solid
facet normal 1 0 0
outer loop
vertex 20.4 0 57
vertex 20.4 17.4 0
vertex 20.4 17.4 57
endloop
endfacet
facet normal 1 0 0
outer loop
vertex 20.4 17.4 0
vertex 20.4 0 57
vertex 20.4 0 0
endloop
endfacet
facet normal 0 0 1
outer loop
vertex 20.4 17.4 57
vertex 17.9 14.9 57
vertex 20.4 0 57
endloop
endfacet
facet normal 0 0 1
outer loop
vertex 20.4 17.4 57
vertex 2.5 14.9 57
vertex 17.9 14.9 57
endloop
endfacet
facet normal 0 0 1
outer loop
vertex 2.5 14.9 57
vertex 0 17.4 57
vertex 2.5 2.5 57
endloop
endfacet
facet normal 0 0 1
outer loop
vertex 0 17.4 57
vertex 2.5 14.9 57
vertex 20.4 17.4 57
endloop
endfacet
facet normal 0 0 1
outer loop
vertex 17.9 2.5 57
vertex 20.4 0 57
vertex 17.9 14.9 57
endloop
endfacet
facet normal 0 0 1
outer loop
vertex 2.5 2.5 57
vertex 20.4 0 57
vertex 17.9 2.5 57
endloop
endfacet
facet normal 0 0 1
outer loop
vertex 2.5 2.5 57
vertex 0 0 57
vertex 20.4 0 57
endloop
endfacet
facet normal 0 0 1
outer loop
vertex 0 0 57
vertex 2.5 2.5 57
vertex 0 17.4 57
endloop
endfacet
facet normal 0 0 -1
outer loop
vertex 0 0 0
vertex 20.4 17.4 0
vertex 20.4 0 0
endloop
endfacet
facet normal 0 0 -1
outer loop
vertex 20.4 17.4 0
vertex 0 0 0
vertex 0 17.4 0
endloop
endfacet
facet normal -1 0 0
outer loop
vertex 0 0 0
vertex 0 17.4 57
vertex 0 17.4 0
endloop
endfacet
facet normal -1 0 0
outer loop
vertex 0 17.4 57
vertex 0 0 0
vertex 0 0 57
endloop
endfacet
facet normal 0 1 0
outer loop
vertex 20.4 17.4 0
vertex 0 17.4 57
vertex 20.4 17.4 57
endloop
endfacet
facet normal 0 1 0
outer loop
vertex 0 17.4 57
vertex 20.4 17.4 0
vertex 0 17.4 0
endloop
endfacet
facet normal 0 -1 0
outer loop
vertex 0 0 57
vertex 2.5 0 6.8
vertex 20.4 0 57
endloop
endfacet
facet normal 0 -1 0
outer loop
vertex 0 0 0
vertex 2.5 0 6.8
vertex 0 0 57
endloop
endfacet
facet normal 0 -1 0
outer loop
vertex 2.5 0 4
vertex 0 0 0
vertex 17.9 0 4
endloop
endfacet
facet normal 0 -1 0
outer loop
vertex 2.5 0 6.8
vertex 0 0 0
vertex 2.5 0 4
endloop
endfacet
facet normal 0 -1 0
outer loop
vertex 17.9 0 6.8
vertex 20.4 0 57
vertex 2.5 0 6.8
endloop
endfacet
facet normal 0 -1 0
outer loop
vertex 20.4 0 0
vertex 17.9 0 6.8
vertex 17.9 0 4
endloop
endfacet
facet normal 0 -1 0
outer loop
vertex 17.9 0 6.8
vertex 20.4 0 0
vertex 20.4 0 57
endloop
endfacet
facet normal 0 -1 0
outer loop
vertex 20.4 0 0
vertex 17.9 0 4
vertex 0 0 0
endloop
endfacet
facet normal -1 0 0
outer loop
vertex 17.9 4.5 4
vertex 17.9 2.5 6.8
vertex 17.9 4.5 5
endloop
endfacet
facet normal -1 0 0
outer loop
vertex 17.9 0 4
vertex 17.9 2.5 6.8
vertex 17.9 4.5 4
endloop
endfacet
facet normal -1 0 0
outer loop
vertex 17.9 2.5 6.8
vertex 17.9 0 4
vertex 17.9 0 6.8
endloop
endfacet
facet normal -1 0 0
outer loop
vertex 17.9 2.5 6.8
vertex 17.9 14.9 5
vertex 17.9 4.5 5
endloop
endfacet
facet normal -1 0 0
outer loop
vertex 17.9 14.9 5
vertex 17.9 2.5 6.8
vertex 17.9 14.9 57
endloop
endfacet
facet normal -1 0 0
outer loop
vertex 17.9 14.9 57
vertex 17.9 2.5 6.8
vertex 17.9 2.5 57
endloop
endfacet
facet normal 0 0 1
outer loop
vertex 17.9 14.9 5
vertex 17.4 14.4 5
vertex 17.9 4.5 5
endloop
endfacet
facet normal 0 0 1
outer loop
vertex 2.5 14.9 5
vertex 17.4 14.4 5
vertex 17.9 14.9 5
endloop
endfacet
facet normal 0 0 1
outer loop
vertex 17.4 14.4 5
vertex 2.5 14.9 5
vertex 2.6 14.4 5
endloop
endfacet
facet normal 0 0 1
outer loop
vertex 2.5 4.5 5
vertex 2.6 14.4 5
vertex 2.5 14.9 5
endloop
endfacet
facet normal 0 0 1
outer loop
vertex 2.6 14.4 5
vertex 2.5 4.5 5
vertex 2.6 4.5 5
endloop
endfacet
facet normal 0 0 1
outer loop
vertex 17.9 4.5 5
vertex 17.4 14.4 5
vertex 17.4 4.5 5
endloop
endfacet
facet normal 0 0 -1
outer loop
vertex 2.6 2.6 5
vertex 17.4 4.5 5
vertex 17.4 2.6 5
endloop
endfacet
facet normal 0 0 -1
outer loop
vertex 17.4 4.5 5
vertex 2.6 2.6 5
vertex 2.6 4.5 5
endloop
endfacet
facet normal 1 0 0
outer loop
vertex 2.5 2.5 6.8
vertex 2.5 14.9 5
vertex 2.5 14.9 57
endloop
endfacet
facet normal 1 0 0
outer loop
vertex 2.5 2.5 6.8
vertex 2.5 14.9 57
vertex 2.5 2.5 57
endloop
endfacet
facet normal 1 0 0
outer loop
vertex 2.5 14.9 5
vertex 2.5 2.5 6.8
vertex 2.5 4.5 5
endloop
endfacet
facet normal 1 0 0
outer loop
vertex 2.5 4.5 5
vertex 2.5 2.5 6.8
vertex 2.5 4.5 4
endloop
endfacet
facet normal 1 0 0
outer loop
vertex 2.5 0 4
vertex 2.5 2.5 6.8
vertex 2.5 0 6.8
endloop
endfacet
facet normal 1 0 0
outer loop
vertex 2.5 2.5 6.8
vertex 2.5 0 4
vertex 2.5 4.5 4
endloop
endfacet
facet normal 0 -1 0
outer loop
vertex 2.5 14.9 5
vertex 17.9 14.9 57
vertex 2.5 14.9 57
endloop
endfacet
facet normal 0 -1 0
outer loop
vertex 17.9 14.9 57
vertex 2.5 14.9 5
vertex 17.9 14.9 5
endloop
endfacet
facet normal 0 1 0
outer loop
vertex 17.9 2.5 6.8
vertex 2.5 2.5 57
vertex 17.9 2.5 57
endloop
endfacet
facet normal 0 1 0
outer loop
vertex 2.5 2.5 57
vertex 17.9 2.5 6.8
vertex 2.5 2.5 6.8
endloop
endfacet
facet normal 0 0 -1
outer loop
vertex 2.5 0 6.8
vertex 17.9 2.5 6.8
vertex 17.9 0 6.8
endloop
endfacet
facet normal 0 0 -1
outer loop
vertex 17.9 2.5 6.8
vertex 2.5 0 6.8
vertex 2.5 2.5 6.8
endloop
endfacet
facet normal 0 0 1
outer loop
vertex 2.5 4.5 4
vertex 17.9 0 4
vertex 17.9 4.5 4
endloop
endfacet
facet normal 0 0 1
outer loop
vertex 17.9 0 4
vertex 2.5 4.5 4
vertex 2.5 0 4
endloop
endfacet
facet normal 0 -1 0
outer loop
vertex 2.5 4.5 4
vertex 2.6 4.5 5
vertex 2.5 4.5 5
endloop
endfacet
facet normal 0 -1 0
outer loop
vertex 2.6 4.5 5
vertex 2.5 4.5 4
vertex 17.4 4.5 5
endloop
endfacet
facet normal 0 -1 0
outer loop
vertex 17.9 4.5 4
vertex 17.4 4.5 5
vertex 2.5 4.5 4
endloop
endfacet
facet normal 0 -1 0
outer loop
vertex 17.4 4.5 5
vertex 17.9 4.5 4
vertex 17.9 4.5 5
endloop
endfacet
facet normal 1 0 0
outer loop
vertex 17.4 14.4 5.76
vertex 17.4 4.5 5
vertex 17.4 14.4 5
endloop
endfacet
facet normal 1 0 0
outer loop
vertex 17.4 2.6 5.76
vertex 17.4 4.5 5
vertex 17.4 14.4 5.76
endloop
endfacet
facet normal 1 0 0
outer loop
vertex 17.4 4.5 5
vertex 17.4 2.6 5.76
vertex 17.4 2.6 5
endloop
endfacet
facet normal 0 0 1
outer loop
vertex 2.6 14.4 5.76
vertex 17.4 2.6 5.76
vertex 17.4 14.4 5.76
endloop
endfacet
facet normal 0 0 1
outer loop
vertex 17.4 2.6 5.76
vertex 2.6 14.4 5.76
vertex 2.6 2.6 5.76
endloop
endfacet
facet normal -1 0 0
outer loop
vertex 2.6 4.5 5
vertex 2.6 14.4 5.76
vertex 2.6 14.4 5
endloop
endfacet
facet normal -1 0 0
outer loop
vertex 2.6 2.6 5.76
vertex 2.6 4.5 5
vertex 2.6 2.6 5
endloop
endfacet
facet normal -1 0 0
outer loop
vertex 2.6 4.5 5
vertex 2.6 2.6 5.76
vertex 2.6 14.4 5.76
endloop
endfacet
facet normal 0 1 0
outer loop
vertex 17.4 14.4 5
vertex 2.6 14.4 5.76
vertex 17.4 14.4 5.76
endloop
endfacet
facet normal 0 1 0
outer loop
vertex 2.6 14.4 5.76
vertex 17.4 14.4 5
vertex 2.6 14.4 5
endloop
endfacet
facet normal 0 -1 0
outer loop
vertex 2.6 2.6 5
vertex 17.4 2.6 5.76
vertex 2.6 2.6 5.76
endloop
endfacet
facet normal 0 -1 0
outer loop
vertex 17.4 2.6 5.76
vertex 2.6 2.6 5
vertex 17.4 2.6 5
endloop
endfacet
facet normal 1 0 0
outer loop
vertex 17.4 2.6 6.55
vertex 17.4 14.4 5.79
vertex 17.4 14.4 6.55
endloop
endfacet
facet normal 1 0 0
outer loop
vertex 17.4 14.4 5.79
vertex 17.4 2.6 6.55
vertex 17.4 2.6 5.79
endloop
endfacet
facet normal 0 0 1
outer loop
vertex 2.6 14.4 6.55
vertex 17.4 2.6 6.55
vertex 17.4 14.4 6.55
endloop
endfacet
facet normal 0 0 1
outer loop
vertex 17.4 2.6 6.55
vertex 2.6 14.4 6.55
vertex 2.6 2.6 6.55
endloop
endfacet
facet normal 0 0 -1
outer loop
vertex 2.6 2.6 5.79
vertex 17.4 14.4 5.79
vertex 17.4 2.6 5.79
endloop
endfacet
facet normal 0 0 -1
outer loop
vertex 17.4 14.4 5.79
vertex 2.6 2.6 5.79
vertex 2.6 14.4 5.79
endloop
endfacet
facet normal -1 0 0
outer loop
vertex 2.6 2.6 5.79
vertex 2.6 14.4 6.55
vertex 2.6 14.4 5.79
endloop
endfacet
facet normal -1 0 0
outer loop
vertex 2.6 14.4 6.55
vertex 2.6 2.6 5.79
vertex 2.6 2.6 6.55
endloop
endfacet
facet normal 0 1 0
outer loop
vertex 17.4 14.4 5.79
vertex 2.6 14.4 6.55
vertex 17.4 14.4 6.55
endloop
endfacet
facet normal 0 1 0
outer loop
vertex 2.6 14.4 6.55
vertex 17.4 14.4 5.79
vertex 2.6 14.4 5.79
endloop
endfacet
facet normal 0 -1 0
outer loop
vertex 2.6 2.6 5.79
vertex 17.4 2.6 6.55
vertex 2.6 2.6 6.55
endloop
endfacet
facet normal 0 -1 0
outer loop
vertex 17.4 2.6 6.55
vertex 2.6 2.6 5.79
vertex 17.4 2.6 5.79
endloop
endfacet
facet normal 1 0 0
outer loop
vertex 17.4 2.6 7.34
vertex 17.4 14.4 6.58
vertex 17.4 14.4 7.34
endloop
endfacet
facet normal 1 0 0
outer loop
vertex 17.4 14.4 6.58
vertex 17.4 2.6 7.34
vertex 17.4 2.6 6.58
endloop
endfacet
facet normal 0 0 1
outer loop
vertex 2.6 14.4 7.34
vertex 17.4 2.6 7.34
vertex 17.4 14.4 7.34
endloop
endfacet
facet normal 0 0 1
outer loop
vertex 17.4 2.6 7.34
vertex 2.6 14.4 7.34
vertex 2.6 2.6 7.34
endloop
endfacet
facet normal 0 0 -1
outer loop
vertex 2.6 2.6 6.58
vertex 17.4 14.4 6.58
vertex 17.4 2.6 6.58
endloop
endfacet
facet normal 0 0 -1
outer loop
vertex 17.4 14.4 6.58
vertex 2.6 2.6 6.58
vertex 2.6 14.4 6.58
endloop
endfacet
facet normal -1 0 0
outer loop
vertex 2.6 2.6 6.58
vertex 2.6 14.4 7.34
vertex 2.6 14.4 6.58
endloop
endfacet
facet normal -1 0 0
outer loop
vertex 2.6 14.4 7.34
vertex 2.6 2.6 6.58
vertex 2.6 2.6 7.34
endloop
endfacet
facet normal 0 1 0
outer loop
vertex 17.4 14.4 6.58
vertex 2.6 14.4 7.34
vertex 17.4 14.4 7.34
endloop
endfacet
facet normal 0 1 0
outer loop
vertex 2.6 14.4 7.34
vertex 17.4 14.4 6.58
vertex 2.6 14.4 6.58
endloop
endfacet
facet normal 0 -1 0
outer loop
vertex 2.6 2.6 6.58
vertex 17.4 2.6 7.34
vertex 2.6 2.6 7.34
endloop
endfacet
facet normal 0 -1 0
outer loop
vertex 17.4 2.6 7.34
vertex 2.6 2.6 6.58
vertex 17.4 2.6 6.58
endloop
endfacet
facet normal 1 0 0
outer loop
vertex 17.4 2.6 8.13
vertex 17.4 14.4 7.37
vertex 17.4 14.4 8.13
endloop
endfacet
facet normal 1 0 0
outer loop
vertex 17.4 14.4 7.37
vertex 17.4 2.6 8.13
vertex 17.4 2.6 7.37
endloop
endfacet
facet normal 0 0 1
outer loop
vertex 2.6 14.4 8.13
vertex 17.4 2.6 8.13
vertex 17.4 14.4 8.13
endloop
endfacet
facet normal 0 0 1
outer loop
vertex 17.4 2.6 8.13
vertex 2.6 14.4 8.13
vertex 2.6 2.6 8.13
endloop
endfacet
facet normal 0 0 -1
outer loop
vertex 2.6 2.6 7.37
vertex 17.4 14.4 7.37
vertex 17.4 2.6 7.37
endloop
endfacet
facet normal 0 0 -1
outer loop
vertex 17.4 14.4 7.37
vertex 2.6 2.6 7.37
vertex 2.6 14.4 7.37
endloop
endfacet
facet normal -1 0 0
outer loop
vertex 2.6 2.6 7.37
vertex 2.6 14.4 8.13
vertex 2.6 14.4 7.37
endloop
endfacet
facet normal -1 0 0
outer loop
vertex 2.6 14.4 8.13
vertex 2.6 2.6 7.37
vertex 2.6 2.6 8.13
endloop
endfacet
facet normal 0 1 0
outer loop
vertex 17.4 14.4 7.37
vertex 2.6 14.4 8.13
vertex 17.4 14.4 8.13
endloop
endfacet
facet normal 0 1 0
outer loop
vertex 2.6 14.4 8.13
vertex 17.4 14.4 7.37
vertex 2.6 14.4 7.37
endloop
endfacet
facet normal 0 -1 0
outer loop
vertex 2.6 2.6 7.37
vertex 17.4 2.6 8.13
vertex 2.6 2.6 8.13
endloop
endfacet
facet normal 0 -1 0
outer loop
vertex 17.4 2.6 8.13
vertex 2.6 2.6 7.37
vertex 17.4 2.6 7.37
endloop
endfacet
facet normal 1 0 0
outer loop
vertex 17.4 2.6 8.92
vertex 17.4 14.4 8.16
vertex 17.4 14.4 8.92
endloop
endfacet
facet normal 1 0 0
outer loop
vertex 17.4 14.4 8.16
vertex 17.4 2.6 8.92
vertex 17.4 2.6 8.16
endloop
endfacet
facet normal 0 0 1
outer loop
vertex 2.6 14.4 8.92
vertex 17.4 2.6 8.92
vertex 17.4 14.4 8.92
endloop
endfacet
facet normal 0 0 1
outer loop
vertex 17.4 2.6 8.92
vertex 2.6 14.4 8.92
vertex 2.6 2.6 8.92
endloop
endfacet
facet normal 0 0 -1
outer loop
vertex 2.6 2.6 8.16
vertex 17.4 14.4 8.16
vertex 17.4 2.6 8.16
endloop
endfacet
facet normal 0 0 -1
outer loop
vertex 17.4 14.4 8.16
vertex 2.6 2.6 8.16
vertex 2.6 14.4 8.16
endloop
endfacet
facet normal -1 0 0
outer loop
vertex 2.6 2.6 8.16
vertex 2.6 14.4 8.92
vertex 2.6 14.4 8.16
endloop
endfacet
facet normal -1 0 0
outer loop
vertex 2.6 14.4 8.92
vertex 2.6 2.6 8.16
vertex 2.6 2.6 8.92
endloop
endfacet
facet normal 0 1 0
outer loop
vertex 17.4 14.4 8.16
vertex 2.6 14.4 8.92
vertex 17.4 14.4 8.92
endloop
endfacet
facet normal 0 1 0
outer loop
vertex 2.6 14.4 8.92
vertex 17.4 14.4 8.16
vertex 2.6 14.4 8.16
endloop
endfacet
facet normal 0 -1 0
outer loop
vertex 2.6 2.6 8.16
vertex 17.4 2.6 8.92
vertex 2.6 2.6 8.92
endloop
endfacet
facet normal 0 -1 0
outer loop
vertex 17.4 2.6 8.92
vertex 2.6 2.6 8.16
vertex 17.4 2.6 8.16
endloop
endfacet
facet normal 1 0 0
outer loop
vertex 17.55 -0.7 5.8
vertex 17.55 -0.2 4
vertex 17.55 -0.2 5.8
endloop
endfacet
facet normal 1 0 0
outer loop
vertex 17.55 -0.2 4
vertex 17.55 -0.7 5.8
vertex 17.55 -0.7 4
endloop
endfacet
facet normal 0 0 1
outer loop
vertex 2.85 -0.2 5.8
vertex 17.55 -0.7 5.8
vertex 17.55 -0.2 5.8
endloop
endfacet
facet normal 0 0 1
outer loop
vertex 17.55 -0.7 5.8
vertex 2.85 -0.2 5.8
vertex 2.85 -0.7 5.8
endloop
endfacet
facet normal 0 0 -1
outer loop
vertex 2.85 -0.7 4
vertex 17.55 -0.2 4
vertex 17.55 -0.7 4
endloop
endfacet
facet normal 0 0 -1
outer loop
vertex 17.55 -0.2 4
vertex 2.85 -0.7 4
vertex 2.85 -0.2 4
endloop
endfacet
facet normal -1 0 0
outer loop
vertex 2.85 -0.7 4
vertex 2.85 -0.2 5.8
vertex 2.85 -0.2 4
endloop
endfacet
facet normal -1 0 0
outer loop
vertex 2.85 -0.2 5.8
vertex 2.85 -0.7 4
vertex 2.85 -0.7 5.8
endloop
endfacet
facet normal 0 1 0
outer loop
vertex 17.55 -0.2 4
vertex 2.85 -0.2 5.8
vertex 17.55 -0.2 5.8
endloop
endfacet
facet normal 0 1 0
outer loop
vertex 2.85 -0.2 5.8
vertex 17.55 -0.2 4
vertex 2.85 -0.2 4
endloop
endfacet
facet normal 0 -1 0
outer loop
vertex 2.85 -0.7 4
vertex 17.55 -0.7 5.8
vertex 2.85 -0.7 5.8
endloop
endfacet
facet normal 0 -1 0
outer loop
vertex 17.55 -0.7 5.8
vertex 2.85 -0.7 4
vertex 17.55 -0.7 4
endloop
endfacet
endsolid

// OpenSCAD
// Micro-SIM gravity tube - parametric
// Units: mm
$fn = 64;

N_CARDS = 50;
card_w = 15.0;    // longer side
card_d = 12.0;    // short side
card_t = 0.76;

clearance_side = 0.2;    // each side
inner_w = card_w + 2 * clearance_side; // 15.4
inner_d = card_d + 2 * clearance_side; // 12.4

wall = 2.5;
slot_h = 0.8;   // slot height
pusher_thk = 0.5;
pusher_width = inner_w - 0.7;
stroke = card_d + 1.0; // push distance (13.0)

stack_h = N_CARDS * card_t + N_CARDS * 0.03 + 5; // small inter-card gap + headroom

// Body
translate([0, 0, 0])
difference() {
  // outer box
  translate([0, 0, 0])
    cube([inner_w + 2 * wall, inner_d + 2 * wall, stack_h + wall + 10], center=false);

  // internal cavity
  translate([wall, wall, 5])
    cube([inner_w, inner_d, stack_h], center=false);

  // bottom slot cutout (on front face)
  translate([wall, -1, 4]) {
    cube([inner_w, 3 + wall, slot_h + 2], center=false);
  }

  // top opening (for loading)
  translate([wall, wall, stack_h + 5])
    cube([inner_w, inner_d, 20], center=false);
}

// Pusher (visual)
translate([wall + (inner_w - pusher_width) / 2, - (pusher_thk + 0.2), 4])
    cube([pusher_width, pusher_thk, slot_h + 1], center=false);

// optional: show a few cards in stack for scale
for (i = [0:4]) {
  translate([wall + 0.1, wall + 0.1, 5 + i * (card_t + 0.03)])
    cube([card_w - 0.2, card_d - 0.2, card_t], center=false);
}
